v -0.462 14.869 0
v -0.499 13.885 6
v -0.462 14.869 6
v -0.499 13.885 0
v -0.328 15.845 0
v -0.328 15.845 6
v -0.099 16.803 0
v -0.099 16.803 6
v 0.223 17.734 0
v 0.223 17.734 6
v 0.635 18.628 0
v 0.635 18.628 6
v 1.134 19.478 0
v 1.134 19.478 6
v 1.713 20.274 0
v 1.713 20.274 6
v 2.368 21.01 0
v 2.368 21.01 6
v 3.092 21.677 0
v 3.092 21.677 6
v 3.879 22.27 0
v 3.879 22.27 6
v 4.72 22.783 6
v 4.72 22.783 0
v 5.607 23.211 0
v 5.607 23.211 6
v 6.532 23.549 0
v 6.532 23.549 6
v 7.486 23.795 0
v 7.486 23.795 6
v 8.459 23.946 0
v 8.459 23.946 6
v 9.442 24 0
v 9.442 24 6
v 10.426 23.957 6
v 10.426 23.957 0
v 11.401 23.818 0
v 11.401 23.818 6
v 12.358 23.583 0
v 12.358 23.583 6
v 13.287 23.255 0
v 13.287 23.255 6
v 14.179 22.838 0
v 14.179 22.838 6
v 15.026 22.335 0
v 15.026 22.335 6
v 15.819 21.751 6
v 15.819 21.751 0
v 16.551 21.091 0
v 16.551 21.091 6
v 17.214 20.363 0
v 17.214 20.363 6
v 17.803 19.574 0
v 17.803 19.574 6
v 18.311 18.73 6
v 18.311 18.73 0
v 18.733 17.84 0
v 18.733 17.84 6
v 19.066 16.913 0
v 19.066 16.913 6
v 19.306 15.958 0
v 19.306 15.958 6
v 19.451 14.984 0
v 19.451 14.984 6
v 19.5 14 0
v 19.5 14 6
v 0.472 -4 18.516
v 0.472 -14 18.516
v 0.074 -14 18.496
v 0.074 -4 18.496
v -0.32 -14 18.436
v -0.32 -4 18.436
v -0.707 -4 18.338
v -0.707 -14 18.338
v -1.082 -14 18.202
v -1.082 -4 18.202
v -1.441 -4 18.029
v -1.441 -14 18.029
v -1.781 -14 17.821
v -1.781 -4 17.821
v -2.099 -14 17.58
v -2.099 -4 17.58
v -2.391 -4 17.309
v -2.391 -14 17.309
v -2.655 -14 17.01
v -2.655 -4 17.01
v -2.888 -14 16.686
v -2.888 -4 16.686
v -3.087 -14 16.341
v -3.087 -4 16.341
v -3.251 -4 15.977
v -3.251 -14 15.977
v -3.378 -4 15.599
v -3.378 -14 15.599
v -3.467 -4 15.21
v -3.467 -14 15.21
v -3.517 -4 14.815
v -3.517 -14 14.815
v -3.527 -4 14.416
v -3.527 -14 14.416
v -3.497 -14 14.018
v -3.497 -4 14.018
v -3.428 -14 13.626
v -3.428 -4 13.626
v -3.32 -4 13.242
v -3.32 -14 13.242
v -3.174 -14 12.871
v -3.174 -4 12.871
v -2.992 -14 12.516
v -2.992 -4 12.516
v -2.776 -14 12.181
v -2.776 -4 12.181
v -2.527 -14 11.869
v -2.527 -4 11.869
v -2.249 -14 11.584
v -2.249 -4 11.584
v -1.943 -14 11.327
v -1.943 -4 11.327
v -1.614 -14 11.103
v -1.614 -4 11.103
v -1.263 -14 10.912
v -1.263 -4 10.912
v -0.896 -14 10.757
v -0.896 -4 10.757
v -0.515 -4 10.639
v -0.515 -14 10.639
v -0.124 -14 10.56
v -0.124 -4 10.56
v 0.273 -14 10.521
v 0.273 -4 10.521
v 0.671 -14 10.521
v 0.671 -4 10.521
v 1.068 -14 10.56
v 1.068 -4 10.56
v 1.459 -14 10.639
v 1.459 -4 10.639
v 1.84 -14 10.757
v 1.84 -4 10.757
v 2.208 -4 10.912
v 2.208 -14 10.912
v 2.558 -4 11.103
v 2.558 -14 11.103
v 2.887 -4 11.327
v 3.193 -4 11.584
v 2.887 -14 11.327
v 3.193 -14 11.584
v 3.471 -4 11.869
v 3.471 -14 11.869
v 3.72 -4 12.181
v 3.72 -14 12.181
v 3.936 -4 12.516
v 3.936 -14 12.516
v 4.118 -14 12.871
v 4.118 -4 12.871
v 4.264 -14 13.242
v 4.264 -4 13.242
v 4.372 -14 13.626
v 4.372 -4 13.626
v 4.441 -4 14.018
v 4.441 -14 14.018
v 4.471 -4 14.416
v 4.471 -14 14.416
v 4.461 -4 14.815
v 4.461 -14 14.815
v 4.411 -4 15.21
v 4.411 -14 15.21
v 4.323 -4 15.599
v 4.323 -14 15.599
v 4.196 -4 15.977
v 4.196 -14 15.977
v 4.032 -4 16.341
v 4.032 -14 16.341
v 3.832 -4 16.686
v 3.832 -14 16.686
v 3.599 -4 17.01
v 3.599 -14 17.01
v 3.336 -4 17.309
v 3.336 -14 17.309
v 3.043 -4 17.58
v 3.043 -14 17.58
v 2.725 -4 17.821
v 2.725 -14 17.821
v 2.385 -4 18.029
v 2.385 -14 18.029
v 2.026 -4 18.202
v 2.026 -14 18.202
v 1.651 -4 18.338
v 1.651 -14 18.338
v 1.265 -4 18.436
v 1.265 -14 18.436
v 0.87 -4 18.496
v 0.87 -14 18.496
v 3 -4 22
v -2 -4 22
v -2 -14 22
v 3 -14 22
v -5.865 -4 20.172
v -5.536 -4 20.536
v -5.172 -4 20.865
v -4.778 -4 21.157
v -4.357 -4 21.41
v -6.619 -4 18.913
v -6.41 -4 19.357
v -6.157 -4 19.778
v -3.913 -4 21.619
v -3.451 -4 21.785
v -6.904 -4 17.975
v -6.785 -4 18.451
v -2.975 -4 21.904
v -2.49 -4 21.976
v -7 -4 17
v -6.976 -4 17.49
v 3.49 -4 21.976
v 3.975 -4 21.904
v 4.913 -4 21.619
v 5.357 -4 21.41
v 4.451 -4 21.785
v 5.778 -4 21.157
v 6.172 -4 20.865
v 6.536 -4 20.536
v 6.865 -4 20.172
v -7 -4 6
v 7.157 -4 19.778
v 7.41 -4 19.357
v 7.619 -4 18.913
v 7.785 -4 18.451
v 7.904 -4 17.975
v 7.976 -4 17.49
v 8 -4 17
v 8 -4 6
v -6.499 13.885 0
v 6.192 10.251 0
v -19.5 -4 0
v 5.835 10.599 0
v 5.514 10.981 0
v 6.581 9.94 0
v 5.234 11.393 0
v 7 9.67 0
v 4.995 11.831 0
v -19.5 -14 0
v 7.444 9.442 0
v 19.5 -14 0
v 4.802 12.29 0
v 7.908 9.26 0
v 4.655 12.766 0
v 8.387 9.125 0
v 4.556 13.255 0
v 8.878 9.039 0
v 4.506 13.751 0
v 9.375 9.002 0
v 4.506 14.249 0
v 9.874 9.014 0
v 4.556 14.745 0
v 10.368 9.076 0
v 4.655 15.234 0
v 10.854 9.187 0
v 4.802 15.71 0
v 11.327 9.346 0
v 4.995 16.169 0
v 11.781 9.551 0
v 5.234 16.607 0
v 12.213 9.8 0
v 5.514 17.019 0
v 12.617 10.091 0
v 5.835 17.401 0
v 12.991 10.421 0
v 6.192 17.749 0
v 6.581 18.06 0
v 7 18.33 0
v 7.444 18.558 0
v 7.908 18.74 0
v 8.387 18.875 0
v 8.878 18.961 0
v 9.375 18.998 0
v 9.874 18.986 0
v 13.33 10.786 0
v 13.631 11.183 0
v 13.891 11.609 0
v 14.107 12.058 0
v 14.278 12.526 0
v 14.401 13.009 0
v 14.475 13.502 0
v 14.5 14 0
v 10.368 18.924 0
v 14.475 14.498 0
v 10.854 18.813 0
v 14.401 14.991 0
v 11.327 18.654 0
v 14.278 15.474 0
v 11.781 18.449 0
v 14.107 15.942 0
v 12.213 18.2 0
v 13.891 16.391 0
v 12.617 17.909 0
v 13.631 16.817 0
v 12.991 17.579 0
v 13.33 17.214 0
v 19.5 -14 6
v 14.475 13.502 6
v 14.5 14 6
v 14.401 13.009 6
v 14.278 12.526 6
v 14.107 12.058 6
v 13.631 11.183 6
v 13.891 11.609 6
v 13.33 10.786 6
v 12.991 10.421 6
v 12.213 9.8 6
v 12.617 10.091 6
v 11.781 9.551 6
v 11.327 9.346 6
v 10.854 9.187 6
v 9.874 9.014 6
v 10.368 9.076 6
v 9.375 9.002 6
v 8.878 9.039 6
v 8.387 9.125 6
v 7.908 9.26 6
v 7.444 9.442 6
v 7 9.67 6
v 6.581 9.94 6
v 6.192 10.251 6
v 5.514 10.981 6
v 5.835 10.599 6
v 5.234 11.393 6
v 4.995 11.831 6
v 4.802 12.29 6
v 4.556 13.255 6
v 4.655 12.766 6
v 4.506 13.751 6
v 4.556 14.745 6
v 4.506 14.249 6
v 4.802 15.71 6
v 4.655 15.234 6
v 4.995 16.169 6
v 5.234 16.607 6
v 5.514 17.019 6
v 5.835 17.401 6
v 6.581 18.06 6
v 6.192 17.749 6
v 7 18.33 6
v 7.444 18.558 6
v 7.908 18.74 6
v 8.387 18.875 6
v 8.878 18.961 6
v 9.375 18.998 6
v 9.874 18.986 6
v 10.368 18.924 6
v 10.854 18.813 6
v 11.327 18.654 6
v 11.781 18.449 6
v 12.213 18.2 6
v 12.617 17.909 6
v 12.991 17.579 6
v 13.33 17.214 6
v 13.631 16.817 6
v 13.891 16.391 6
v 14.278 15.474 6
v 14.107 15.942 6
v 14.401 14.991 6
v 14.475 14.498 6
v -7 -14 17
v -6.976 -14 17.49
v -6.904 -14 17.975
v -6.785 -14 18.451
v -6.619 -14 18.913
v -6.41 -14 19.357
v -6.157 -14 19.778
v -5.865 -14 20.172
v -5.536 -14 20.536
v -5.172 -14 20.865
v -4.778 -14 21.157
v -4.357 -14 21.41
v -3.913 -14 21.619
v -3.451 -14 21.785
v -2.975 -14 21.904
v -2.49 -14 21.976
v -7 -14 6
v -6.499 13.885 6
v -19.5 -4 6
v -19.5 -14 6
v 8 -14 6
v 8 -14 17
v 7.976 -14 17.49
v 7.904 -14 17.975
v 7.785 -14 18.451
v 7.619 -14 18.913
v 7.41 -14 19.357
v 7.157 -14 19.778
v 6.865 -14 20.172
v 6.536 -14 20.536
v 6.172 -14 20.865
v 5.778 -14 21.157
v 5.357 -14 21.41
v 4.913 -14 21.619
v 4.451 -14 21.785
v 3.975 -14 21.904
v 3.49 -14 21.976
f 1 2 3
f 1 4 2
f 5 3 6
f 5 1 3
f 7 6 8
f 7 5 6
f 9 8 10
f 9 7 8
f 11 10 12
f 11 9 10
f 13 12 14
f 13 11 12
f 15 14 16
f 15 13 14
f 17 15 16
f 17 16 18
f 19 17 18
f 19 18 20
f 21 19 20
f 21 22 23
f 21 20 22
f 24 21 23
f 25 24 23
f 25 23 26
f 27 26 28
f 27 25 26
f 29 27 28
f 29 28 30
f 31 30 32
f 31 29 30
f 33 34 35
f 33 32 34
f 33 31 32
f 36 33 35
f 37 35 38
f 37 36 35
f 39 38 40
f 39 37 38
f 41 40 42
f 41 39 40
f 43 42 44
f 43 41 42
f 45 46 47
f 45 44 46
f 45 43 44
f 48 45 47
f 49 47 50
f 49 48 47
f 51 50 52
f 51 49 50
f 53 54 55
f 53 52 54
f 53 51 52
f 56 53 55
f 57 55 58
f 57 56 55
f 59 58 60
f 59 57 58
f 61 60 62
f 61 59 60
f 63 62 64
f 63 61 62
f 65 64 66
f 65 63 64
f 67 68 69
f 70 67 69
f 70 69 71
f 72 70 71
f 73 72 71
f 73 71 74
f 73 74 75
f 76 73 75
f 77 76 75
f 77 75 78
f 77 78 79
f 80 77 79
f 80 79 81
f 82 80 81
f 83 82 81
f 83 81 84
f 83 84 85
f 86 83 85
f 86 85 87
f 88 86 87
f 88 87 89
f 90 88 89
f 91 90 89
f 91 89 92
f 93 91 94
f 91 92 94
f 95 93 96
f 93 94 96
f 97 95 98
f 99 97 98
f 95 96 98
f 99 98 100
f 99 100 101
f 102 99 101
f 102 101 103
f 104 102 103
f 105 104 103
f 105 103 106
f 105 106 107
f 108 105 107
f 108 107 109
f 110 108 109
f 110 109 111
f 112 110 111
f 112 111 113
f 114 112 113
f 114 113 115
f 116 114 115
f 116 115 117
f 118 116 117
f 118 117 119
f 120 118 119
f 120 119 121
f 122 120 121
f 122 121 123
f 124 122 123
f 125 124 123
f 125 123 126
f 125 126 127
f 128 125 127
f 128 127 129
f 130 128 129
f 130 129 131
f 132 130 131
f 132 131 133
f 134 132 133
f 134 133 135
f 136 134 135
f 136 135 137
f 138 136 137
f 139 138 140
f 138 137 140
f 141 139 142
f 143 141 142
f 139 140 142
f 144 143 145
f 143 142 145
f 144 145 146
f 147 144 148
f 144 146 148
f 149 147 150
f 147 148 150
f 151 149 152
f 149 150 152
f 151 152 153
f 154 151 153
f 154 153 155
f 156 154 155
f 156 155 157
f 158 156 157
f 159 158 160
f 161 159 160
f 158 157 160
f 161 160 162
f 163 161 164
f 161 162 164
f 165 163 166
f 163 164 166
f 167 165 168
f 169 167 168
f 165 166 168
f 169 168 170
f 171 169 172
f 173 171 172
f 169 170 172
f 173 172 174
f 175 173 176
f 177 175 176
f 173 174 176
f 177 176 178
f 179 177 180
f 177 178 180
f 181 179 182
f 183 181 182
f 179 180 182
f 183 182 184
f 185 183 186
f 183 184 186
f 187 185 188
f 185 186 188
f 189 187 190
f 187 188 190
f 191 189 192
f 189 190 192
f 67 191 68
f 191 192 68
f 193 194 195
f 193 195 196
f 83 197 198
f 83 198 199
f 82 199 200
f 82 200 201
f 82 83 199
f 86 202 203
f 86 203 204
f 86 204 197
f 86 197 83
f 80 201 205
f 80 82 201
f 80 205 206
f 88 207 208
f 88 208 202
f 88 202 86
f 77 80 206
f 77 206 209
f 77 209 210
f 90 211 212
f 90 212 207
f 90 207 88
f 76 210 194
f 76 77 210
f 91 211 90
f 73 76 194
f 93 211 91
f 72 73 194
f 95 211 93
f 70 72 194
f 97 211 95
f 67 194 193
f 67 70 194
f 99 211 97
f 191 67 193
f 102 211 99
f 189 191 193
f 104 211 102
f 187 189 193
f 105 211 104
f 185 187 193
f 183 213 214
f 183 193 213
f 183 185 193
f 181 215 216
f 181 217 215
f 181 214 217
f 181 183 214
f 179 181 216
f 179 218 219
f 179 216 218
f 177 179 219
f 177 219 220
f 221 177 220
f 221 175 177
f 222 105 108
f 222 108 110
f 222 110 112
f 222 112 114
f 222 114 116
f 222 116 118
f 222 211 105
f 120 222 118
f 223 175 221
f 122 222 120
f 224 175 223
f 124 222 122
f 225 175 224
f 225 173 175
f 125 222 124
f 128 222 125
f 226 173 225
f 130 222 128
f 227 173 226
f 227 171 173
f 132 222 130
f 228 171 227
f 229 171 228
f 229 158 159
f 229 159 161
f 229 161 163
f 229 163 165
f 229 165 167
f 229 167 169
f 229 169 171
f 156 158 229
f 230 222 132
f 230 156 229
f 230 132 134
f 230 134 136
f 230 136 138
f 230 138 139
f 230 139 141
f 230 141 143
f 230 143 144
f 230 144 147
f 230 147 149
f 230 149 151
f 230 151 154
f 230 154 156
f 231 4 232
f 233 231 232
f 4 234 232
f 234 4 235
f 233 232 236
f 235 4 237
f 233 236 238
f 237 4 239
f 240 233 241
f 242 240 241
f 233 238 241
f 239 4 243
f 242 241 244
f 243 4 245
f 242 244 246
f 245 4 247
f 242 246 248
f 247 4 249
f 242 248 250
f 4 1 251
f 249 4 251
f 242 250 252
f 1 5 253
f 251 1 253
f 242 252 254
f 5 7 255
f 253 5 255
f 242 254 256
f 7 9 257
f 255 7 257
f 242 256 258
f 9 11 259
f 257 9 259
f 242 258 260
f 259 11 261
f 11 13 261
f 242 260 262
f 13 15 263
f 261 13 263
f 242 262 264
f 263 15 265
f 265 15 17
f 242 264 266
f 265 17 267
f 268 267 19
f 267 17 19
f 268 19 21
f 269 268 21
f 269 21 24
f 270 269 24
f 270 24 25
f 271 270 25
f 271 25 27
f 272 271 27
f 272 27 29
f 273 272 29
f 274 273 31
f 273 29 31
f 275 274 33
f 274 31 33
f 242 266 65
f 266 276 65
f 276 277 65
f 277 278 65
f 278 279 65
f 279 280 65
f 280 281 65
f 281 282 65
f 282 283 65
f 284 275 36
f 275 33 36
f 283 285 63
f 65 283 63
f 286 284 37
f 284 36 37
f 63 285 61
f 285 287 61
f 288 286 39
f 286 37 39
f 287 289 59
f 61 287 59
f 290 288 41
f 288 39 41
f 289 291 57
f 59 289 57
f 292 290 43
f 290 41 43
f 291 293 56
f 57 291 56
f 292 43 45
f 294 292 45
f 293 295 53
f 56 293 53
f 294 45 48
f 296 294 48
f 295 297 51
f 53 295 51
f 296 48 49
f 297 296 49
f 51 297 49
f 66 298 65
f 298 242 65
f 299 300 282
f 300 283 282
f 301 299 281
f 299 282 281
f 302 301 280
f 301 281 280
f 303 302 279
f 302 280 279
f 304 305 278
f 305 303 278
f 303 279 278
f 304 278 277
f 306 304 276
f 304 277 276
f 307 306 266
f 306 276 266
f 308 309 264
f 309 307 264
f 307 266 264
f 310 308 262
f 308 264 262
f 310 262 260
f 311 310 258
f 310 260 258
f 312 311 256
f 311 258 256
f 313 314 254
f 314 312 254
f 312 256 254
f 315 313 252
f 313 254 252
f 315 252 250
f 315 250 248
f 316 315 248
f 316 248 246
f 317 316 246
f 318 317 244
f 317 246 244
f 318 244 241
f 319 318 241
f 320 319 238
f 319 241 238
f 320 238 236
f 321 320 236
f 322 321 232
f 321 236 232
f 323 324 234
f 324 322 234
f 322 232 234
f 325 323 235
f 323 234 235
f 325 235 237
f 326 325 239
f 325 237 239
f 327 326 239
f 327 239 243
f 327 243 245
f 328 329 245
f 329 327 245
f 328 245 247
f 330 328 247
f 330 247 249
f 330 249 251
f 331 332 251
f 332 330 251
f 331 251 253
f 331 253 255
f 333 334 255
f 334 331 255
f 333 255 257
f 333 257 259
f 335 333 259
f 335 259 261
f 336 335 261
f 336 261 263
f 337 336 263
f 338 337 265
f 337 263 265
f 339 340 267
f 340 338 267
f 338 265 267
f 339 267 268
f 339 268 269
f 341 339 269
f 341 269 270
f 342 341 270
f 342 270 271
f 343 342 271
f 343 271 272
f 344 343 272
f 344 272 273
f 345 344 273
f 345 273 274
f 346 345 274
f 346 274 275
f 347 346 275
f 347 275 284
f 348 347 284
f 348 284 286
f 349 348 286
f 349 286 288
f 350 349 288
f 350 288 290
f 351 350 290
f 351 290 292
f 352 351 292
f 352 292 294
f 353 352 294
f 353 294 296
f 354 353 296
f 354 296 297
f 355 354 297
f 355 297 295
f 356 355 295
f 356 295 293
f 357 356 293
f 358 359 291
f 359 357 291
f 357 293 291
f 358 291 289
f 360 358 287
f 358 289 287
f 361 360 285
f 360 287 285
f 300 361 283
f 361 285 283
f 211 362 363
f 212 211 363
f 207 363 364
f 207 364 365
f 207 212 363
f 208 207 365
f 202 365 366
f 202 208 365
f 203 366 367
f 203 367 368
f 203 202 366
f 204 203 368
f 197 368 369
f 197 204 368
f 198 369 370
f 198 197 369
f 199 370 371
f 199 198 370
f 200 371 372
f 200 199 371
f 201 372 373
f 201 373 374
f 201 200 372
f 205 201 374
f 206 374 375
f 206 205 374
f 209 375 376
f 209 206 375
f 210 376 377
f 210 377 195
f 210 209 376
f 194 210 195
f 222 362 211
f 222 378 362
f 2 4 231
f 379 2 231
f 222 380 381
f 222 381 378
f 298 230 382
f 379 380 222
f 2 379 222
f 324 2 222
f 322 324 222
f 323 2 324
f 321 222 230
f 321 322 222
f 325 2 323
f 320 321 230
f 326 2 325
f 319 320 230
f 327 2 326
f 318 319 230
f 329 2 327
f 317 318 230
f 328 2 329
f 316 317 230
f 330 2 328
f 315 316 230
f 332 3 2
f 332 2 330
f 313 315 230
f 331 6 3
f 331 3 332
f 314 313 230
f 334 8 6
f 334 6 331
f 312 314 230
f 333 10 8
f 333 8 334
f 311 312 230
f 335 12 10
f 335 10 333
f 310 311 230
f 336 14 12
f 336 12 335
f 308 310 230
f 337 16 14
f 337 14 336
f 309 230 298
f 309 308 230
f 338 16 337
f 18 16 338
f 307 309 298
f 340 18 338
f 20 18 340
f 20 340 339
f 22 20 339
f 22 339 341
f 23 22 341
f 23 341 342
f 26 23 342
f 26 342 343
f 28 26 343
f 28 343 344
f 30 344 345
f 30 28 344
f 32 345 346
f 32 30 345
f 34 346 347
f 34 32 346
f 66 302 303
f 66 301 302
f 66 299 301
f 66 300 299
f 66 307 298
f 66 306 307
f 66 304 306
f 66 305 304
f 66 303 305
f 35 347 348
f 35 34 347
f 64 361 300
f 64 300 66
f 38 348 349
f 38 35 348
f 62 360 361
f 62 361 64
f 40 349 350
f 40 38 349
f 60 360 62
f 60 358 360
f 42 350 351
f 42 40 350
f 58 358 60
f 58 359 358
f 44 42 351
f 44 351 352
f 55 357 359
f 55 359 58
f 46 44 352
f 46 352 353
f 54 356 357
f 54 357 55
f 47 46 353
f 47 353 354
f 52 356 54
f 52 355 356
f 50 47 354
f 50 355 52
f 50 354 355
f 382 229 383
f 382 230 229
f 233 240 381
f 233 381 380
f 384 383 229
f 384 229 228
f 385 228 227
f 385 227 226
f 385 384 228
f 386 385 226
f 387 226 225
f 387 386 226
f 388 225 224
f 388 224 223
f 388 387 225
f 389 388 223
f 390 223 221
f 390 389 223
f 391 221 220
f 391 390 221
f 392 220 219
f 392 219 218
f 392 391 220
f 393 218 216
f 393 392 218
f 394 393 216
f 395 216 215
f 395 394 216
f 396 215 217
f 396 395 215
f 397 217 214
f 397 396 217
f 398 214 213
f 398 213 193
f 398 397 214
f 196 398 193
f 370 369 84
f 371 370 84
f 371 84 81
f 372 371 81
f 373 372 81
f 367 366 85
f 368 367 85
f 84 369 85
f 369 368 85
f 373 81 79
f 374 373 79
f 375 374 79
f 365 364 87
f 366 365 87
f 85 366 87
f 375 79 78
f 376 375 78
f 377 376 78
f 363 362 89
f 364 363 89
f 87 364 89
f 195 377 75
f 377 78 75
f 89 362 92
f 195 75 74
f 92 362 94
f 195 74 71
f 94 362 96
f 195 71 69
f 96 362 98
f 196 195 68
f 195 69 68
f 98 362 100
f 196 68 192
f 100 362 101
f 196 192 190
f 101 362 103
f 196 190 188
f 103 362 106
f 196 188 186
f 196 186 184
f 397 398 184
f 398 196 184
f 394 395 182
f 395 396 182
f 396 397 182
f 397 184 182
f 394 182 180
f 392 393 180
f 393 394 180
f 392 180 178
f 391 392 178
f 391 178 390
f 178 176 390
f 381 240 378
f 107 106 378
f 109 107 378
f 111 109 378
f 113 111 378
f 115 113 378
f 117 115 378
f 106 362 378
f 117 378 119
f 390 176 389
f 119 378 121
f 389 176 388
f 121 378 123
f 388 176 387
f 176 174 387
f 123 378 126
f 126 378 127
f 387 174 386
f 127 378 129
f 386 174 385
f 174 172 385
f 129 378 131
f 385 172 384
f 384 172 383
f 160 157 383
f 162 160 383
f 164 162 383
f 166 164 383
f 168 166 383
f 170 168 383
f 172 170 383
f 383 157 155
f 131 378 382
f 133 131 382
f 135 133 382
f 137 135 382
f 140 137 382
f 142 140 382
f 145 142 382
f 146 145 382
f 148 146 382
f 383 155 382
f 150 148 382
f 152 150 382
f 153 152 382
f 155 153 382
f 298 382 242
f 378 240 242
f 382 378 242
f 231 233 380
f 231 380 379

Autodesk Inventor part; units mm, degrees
ref_plane "YZ Plane" through (0, 0, 0) normal (1, 0, 0) x (0, 1, 0)
ref_plane "XZ Plane" through (0, 0, 0) normal (0, 1, 0) x (-1, 0, 0)
ref_plane "XY Plane" through (0, 0, 0) normal (0, 0, 1) x (1, 0, 0)
sketch "Esboço1" plane through (0, 0, 0) normal (0, 0, 1) x (1, 0, 0)
  line L0 (19.5, -14) -> (19.5, 14)
  line L1 (-19.5, -14) -> (19.5, 14) construction
  line L2 (19.5, -14) -> (-19.5, 14) construction
  circle A0 centre (9.5, 14) radius 10
  circle A1 centre (9.5, 14) radius 5
  line L3 (-19.5, -14) -> (-19.5, -4)
  line L4 (-0.4993, 13.8849) -> (-6.4993, 13.8849)
  line L5 (-19.5, -4) -> (-6.4993, 13.8849)
  line L6 (-19.5, -14) -> (-7, -14)
  line L7 (-7, -14) -> (-7, -4)
  line L8 (-7, -4) -> (8, -4)
  line L9 (8, -4) -> (8, -14)
  line L10 (8, -14) -> (19.5, -14)
  line L11 (-7, -14) -> (8, -14)
  point P0 (0, 0)
  dimension "d0" = 28
  dimension "d2" = 20
  dimension "d3" = 10
  dimension "d5" = 10
  dimension "d6" = 6
  dimension "d8" = 12.5
  dimension "d9" = 15
  dimension "d10" = 10
  dimension "d11" = 10
  dimension "d12" = 15
  dimension "d13" = 11.5
  dimension "d14" = 22.1107
extrude "Extrusão1" add sketch "Esboço1" along normal blind 6
sketch "Esboço2" plane through (0, 0, 6) normal (0, 0, 1) x (1, 0, 0)
  line L0 (-7, -14) -> (-7, -4)
  line L1 (-7, -4) -> (8, -4)
  line L2 (8, -4) -> (8, -14)
  line L3 (-19.5, -4) -> (-19.5, -14) projected
  line L4 (-19.5, -14) -> (-7, -14)
  line L5 (-7, -14) -> (8, -14)
  line L6 (8, -14) -> (18.5, -14)
  point P0 (0, 0)
  dimension "d17" = 90
  dimension "d18" = 10
  dimension "d19" = 15
  dimension "d20" = 12.5
  dimension "d21" = 10.5
  dimension "d22" = 15
extrude "Extrusão2" add sketch "Esboço2" along normal blind 16
sketch "Esboço3" plane through (-7, -4, 6) normal (0, 1, 0) x (1, 0, 0)
  circle A0 centre (7.4721, -8.5158) radius 4
  point P0 (7, 6)
  dimension "d25" = 8
fillet "Arredondamento1" radius 5 2 edges at (8, -9, 22) (-7, -9, 22)
hole "Furo1" at (0.4721, -4, 14.5158) direction (0, -1, 0) diameter 8 end through all
properties part number "Prova1"
